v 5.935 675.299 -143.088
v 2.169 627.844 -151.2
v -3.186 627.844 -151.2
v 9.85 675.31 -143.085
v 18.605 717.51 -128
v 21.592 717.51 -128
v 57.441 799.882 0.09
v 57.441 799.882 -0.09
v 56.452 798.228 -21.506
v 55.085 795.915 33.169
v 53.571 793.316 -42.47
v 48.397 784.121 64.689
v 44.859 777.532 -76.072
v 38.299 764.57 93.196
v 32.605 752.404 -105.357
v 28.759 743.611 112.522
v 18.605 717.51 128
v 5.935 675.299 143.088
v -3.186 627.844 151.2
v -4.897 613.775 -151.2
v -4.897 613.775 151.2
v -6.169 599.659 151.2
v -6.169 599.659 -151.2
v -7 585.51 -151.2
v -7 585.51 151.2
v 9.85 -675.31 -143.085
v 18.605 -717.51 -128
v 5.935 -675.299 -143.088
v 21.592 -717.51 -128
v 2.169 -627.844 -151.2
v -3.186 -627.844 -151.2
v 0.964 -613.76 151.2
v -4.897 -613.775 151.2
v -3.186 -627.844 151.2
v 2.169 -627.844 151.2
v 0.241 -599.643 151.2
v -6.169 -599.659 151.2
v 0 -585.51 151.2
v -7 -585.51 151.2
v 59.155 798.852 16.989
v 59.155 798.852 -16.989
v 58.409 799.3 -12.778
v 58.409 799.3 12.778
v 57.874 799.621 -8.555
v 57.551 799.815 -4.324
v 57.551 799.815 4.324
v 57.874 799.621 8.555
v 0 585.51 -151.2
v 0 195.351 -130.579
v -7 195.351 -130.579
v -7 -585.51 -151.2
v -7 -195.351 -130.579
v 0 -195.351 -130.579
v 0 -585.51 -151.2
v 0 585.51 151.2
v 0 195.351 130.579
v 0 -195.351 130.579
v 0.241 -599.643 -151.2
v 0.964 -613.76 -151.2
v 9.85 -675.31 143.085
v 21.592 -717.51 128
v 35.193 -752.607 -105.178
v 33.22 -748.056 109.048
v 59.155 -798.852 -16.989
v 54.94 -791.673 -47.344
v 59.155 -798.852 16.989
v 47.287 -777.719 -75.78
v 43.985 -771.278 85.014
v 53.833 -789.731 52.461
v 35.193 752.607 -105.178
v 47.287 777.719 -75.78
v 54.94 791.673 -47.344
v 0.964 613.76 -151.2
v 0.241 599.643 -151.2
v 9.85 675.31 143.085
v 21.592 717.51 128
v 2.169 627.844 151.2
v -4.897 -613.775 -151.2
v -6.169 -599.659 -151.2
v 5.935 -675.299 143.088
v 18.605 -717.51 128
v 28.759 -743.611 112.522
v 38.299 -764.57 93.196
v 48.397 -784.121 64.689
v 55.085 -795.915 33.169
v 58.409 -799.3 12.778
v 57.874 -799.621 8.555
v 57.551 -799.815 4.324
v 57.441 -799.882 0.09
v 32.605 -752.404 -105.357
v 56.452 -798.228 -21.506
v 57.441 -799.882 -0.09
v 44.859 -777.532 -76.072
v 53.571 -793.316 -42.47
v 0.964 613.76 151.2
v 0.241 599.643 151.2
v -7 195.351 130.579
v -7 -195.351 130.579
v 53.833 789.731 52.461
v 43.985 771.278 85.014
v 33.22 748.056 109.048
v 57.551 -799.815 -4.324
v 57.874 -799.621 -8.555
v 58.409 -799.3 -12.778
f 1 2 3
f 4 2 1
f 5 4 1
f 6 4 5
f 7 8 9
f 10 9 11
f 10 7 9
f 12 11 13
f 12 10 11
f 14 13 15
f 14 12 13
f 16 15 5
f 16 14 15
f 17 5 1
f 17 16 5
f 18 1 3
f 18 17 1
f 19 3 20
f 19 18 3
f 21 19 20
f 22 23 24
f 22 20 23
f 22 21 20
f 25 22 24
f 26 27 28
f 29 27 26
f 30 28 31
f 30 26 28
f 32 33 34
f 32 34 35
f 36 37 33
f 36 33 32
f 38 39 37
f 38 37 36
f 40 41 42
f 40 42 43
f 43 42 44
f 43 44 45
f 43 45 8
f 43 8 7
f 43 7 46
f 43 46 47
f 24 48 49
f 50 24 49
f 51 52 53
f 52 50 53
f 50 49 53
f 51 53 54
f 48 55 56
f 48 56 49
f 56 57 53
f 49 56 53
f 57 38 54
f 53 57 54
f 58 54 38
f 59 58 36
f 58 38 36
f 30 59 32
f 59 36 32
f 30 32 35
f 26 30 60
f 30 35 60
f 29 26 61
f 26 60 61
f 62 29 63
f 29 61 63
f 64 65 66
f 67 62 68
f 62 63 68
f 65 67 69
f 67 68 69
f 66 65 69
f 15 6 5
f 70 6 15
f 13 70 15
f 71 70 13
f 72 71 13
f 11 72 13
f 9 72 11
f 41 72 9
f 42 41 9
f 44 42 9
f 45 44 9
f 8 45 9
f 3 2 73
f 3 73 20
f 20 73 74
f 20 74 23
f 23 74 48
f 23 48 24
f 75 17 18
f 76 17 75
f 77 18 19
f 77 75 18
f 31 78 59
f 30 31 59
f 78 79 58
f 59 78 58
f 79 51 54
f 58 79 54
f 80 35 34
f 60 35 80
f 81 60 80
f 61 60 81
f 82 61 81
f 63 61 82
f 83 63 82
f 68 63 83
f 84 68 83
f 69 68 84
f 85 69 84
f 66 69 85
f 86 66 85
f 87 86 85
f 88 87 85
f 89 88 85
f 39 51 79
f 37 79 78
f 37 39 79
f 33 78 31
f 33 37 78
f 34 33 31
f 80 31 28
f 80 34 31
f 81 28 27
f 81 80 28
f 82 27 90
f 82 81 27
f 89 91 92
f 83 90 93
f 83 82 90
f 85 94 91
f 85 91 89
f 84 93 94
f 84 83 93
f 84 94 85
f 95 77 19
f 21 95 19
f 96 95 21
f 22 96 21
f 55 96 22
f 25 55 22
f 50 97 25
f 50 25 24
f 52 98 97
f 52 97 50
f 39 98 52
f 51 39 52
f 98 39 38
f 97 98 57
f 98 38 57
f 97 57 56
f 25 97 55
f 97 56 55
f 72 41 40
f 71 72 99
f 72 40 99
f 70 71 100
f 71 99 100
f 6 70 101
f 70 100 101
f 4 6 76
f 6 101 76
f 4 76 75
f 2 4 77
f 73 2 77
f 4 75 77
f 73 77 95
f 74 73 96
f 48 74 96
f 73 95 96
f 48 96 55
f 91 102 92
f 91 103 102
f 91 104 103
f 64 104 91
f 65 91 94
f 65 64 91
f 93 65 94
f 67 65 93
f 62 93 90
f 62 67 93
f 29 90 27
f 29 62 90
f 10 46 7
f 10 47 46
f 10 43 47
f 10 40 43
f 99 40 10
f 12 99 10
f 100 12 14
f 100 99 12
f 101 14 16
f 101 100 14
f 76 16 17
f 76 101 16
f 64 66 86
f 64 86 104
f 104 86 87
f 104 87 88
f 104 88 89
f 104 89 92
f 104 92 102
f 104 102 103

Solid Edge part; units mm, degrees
sketch "Sketch1" plane through (0, 0, 0) normal (1, 0, 0) x (0, 1, 0)
  arc A0 (-585.5098, 151.2) -> (585.5098, 151.2) centre (0, 7528) ccw
  line L0 (585.5098, 151.2) -> (585.5098, -151.2)
  arc A1 (-585.5098, -151.2) -> (585.5098, -151.2) centre (0, -7528) cw
  line L1 (-585.5098, 151.2) -> (-585.5098, -151.2)
extrude "Protrusion1" add sketch "Sketch1" against normal blind 7
sketch "Sketch2" plane through (0, -800, 0) normal (0, 0, -1) x (1, 0, 0)
  arc A0 (59.1552, -1.148) -> (0, -214.4902) centre (414.2845, -214.4902) ccw
  line L0 (0, -214.4902) -> (-7, -214.4902)
  arc A1 (-7, -214.4902) -> (57.4408, -0.1181) centre (446.8281, -234.0406) cw
  line L1 (57.4408, -0.1181) -> (59.1552, -1.148)
extrude "ExtrudedProtrusion_4" add sketch "Sketch2" along normal mid plane 302.4
sketch "Sketch3" plane through (59.1552, 0, 0) normal (1, 0, 0) x (0, 0, 1)
  arc A0 (-128, 717.5098) -> (128, 717.5098) centre (0, 659.2447) cw
  arc A1 (128, 717.5098) -> (151.2, 585.5098) centre (-115.4835, 606.677) cw
  line L0 (265.9453, 585.5098) -> (151.2, 585.5098)
  line L1 (265.9453, 882.5583) -> (265.9453, 585.5098)
  line L2 (-248.3835, 882.5583) -> (265.9453, 882.5583)
  line L3 (-248.3835, 585.5098) -> (-248.3835, 882.5583)
  line L4 (-151.2, 585.5098) -> (-248.3835, 585.5098)
  arc A2 (-151.2, 585.5098) -> (-128, 717.5098) centre (115.4835, 606.677) cw
extrude "Cutout1" cut sketch "Sketch3" against normal through all
mirror "Mirror1" about plane through (0, 0, 0) normal (0, -1, 0) of "ExtrudedProtrusion_4"
sketch "Sketch4" plane through (59.1552, 0, 0) normal (1, 0, 0) x (0, 0, 1)
  line L0 (-268.9862, -585.5098) -> (-151.2, -585.5098)
  arc A0 (-151.2, -585.5098) -> (-128, -717.5098) centre (115.4835, -606.677) ccw
  arc A1 (-128, -717.5098) -> (128, -717.5098) centre (0, -659.2447) ccw
  arc A2 (128, -717.5098) -> (151.2, -585.5098) centre (-115.4835, -606.677) ccw
  line L1 (359.5482, -585.5098) -> (151.2, -585.5098)
  line L2 (359.5482, -919.291) -> (359.5482, -585.5098)
  line L3 (-268.9862, -919.291) -> (359.5482, -919.291)
  line L4 (-268.9862, -585.5098) -> (-268.9862, -919.291)
extrude "Cutout2" cut sketch "Sketch4" against normal through all
